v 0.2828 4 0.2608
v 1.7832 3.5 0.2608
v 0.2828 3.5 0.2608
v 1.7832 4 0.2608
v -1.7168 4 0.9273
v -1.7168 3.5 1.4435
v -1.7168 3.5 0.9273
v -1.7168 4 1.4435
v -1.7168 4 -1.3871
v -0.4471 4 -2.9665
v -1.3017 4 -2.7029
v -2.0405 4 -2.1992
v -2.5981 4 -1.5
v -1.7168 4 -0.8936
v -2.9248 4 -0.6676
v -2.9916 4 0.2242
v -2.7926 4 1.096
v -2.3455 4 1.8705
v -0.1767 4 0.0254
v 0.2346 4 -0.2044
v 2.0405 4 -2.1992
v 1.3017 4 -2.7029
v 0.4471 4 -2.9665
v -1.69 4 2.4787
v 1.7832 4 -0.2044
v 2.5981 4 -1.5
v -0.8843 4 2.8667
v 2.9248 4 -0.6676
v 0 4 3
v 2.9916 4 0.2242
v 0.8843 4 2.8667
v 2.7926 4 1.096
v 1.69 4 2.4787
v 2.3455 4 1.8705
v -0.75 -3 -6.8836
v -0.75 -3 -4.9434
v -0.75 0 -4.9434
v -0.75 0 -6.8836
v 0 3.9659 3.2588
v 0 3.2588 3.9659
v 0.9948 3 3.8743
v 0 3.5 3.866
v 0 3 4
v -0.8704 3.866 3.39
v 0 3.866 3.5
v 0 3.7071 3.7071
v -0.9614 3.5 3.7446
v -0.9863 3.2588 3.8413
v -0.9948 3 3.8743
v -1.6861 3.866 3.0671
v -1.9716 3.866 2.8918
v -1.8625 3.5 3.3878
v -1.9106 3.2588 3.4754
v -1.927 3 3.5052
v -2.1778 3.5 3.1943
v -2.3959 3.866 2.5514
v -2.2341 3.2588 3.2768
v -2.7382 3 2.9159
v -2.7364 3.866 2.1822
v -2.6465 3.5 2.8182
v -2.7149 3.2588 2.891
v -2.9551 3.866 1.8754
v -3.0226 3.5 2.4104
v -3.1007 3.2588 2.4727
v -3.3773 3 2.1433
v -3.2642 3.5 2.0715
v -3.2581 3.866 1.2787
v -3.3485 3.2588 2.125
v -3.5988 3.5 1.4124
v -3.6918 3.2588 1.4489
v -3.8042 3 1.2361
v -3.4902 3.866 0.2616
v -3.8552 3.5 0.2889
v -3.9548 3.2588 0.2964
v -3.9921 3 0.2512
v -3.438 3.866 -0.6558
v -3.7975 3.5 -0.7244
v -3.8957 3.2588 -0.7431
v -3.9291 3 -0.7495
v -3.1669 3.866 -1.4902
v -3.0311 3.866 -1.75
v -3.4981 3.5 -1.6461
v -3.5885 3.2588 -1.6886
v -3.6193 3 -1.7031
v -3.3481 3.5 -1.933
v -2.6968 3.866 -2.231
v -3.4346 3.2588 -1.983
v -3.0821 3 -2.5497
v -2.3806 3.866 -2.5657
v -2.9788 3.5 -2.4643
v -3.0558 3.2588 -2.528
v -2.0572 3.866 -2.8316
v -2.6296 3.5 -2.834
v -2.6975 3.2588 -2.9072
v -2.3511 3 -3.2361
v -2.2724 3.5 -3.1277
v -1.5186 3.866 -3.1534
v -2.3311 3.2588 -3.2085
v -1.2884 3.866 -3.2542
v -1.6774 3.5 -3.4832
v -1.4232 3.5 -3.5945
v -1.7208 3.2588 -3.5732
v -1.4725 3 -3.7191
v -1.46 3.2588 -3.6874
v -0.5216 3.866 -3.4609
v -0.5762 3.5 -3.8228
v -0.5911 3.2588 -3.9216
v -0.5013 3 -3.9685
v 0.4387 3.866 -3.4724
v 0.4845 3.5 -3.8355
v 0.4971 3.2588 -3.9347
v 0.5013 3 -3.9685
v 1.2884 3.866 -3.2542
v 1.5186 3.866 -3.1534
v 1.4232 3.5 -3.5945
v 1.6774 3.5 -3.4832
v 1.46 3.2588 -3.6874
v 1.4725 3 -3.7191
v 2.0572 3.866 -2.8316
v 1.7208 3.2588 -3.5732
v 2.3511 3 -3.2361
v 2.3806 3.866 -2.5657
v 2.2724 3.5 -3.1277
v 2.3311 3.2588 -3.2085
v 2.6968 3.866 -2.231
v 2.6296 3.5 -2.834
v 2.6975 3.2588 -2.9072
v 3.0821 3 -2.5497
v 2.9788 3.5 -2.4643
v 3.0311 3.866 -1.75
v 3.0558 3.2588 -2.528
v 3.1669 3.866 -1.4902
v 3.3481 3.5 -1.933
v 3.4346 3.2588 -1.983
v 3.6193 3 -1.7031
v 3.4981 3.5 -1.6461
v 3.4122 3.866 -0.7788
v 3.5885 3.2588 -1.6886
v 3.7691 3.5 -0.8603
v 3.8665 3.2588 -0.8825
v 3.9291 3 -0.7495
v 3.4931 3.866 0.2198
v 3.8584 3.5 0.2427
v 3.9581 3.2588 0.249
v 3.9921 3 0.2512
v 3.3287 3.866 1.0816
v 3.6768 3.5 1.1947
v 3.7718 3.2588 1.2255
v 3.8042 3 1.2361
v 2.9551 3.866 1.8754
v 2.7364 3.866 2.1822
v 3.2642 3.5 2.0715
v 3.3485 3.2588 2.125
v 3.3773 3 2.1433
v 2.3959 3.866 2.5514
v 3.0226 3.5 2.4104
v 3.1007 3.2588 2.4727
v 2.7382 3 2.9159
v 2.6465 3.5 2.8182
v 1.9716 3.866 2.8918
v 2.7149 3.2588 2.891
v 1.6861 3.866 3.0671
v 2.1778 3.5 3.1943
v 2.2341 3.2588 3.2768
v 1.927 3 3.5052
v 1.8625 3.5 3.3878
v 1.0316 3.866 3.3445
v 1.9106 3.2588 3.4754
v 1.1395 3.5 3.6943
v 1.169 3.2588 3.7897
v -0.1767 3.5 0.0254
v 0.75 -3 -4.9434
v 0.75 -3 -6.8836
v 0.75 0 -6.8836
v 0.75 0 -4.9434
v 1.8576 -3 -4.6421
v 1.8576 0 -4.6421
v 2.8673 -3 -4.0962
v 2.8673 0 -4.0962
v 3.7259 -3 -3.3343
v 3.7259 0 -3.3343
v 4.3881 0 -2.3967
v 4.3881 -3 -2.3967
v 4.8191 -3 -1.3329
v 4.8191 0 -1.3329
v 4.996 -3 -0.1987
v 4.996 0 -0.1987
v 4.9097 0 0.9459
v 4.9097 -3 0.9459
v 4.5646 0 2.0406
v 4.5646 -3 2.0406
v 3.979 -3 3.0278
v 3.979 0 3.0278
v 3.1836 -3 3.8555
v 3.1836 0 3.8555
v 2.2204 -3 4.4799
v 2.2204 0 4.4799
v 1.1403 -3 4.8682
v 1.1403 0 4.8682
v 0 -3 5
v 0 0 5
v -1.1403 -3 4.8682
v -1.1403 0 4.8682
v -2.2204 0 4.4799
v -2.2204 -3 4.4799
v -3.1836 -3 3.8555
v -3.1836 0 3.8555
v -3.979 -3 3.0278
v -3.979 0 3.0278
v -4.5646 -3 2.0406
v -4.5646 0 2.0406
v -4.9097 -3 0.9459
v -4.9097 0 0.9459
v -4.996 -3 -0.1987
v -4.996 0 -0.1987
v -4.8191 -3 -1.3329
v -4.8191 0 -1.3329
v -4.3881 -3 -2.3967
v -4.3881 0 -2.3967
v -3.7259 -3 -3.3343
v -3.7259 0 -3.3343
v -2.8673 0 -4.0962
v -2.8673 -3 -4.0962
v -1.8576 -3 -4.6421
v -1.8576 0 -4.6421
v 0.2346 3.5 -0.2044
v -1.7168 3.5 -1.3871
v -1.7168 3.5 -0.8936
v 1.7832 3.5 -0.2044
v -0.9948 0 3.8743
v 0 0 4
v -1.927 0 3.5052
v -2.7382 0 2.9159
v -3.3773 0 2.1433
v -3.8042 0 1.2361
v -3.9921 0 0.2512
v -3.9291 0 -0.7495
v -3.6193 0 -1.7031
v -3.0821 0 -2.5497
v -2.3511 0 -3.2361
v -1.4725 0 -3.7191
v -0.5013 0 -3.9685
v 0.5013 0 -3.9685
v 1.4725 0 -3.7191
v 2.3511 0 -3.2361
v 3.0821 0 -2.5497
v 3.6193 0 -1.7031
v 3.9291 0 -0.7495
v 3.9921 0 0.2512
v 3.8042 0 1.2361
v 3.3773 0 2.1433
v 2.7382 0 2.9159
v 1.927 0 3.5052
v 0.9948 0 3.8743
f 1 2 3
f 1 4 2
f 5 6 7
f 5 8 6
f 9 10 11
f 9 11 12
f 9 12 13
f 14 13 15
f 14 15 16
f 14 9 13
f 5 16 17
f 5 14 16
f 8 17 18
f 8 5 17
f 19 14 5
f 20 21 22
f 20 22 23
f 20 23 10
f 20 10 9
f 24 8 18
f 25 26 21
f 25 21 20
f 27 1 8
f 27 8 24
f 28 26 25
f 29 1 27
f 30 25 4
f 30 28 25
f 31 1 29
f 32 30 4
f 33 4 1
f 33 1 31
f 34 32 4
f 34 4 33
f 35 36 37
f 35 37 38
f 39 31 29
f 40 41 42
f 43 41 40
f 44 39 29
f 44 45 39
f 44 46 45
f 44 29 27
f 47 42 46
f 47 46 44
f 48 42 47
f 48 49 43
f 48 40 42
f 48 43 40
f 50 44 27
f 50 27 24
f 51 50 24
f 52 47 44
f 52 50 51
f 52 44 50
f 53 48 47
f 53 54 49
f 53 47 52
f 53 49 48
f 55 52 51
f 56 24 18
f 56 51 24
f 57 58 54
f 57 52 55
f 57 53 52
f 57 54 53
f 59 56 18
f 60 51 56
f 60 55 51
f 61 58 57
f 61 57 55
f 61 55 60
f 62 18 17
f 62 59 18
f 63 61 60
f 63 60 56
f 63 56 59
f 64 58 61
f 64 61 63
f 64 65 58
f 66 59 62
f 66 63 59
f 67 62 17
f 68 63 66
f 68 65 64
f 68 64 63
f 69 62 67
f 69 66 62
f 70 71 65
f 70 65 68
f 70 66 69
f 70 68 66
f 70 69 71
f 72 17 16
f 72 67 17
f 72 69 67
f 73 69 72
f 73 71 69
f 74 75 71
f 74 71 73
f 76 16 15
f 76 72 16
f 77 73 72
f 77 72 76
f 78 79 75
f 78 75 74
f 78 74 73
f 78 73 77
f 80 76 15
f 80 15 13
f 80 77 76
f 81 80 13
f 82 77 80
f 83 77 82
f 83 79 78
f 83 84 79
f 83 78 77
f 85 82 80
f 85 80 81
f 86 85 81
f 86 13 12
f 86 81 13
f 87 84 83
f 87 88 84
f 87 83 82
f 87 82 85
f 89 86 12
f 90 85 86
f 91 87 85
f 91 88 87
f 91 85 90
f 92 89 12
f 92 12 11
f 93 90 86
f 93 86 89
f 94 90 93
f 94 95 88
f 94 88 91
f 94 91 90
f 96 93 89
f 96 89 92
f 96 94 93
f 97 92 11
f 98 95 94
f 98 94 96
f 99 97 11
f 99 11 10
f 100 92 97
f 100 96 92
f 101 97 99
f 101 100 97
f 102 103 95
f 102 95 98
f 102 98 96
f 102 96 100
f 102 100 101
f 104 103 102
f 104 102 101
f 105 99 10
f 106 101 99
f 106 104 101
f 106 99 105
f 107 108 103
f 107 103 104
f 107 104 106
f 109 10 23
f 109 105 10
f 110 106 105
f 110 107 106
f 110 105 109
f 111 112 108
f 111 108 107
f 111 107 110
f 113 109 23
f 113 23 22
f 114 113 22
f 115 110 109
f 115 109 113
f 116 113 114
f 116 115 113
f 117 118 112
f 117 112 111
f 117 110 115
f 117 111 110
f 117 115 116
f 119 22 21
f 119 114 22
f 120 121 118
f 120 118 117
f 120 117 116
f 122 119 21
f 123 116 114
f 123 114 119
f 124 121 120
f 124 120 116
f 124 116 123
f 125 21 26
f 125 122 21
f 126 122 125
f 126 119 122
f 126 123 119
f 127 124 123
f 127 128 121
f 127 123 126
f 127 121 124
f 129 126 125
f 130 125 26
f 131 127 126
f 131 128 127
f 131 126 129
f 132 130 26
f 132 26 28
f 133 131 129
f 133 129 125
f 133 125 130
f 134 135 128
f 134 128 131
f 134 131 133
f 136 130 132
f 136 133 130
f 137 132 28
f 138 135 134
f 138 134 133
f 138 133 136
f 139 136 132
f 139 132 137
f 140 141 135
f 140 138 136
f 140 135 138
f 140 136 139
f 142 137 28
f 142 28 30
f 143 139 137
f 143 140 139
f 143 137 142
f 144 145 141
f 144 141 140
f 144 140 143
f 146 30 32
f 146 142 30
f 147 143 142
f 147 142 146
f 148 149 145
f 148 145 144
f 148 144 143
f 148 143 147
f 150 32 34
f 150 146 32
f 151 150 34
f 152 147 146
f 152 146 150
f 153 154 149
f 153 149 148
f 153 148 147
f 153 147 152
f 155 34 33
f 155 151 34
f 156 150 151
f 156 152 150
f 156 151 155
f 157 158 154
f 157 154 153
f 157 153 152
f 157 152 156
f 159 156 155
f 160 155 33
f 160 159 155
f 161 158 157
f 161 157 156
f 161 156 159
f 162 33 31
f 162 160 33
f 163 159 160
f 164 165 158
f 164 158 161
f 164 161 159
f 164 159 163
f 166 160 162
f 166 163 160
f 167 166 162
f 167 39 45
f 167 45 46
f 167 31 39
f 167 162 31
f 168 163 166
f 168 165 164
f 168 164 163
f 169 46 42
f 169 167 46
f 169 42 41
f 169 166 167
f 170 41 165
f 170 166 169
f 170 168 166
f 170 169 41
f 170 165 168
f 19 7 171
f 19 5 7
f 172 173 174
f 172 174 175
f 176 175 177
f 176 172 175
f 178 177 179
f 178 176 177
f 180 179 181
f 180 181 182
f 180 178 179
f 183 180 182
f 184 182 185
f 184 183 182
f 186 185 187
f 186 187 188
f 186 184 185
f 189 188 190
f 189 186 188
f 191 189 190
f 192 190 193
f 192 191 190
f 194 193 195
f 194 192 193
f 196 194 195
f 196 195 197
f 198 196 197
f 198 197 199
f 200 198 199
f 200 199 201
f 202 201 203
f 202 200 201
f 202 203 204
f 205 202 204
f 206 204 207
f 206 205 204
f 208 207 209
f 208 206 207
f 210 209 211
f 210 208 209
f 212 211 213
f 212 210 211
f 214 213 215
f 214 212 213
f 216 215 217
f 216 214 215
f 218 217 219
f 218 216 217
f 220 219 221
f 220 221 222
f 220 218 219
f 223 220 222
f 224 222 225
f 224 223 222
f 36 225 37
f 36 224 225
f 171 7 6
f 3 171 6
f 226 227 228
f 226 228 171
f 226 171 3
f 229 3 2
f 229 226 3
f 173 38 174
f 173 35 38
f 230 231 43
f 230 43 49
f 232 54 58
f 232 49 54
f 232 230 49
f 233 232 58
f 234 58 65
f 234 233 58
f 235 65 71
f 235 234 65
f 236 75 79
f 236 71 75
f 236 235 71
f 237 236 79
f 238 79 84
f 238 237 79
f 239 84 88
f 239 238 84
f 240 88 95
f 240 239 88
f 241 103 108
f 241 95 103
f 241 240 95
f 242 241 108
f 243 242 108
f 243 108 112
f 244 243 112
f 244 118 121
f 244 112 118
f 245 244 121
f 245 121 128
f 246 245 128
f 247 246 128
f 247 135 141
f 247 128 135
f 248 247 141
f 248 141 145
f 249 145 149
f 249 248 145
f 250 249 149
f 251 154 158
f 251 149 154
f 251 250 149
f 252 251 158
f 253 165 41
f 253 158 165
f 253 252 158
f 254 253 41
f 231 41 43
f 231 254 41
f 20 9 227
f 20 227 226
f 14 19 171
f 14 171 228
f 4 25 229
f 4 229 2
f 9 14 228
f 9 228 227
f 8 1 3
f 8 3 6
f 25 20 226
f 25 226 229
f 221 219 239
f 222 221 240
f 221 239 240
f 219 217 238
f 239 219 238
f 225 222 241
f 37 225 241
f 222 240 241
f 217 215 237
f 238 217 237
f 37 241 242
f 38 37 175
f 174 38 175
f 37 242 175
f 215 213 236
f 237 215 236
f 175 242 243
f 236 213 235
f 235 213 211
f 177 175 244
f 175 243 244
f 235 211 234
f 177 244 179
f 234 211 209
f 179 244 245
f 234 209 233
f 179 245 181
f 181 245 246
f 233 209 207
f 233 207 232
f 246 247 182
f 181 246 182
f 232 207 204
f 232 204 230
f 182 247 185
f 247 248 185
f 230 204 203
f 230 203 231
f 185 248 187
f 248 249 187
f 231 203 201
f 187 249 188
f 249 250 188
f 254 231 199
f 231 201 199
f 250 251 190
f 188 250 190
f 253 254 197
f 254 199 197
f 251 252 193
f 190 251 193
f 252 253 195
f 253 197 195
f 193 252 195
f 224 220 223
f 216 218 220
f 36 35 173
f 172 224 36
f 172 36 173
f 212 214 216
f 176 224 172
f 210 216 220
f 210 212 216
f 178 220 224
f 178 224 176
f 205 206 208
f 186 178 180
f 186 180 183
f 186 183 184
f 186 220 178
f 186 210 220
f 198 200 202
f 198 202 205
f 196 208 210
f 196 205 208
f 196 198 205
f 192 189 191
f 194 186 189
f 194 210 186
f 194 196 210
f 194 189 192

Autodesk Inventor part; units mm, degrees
ref_plane "YZ Plane" through (0, 0, 0) normal (1, 0, 0) x (0, 1, 0)
ref_plane "XZ Plane" through (0, 0, 0) normal (0, 1, 0) x (-1, 0, 0)
ref_plane "XY Plane" through (0, 0, 0) normal (0, 0, 1) x (1, 0, 0)
sketch "Skizze1" plane through (0, 0, 0) normal (1, 0, 0) x (0, 1, 0)
  line L0 (4, 0) -> (4, 3)
  arc A0 (4, 3) -> (3, 4) centre (3, 3) ccw
  line L1 (3, 4) -> (0, 4)
  line L2 (0, 4) -> (0, 5)
  line L3 (0, 5) -> (-3, 5)
  line L4 (-3, 5) -> (-3, 2)
  line L5 (0, 0) -> (4, 0)
  line L6 (-3, 2) -> (-3, 0)
  line L7 (-3, 0) -> (0, 0)
  point P0 (0, 2)
  dimension "d0" = 2
  dimension "d1" = 4
  dimension "d2" = 3
  dimension "d3" = 5
  dimension "d4" = 3
  dimension "d5" = 1
  dimension "d6" = 1
revolve "Umdrehung1" add sketch "Skizze1" angle 360 about axis through (0, 0, 0) along (0, 1, 0)
sketch "Skizze2" plane through (0, 4, 0) normal (0, 1, 0) x (1, 0, 0)
  line L0 (-1.7168, -1.418) -> (-1.7168, 1.5147) construction
  line L1 (-1.7168, 1.5147) -> (1.7832, 1.5147) construction
  line L2 (1.7832, 1.5147) -> (1.7832, -1.418) construction
  line L3 (1.7832, -1.418) -> (-1.7168, -1.418) construction
  line L4 (-1.7168, 1.3871) -> (0.2346, 0.2044)
  line L5 (0.2346, 0.2044) -> (1.7832, 0.2044)
  line L6 (1.7832, 0.2044) -> (1.7832, -0.2608)
  line L7 (1.7832, -0.2608) -> (0.2828, -0.2608)
  line L8 (0.2828, -0.2608) -> (-1.7168, -1.4435)
  line L9 (-1.7168, -1.4435) -> (-1.7168, -0.9273)
  line L10 (-1.7168, -0.9273) -> (-0.1767, -0.0254)
  line L11 (-0.1767, -0.0254) -> (-1.7168, 0.8936)
  line L12 (-1.7168, 0.8936) -> (-1.7168, 1.3871)
  point P0 (0, 0)
extrude "Extrusion1" cut sketch "Skizze2" against normal blind 0.5
sketch "Skizze4" plane through (0, -3, 0) normal (0, -1, 0) x (1, 0, 0)
  line L0 (0.75, -4.8836) -> (-0.75, -4.8836)
  line L1 (-0.75, -4.8836) -> (-0.75, -6.8836)
  line L2 (-0.75, -6.8836) -> (0.75, -6.8836)
  line L3 (0.75, -6.8836) -> (0.75, -4.8836)
  point P0 (0, 0)
  dimension "d15" = 1.5
  dimension "d16" = 2
  dimension "d17" = 0.75
extrude "Extrusion3" add sketch "Skizze4" against normal blind 3
properties part number "ButtonY_neu"
